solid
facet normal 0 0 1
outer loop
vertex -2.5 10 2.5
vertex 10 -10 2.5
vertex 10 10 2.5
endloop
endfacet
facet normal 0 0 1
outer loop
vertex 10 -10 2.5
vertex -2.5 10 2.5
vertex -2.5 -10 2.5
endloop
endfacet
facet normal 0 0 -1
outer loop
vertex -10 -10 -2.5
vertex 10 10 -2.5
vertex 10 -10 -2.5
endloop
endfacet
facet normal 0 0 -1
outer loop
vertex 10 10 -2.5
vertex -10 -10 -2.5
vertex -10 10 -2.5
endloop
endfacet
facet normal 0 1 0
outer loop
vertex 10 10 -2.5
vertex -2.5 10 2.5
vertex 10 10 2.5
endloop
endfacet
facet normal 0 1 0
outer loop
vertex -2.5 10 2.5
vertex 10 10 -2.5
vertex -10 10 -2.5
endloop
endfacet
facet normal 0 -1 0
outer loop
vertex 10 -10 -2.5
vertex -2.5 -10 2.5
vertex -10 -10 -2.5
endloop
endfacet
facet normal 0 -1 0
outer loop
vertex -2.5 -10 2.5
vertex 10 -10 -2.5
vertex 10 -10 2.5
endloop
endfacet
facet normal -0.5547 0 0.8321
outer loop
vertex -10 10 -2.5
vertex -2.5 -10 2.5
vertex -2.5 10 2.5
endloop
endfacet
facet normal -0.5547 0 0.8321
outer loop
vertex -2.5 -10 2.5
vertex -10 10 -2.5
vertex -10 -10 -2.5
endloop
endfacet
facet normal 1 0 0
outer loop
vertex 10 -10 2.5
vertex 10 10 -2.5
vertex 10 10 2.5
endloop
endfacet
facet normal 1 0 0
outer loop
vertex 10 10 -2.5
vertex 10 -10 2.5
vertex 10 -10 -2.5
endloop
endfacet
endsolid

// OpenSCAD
trapezoid_prism(width_lower=20, width_upper=5, depth=20, height=5, center=true, square_right=true);

module trapezoid_prism (width_lower, width_upper, depth, height, center, square_right=false) {
    /* Contruct a trapezoid prism.
    
    The prism will have it's base on the x/y plane, and it's
        top in the positive z direction.
    
    Args:
        width_lower: The width of the lower base (x-axis). Must
            be equal or greater than width_upper.
        width_upper: The width of the upper base (x-axis)
        depth: The depth of the prism (y-axis)
        height: The distance of the top from the base (z-axis)
        center: If True, the bounding box of the prism will be
            centered at (0,0,0)
        square_right: If true, the right side will not slop as expected in
            a trapezoid, but instead will be like a rectangle. Useful for 
            snap fit connectors.
    */
    
    // The prisms will twice as wide as needed, but will be 
    // unioned with the main cube to cut them in half.
    triangular_prisms_width = (width_lower - width_upper); 
    
    
    union() {
    //main cube
        cube([width_upper, depth, height], center=center);
        translate([-1 * width_upper/2, 0,0]){
            triangular_prism(width=triangular_prisms_width, depth=depth, height=height, center=center);
        }
        
        if (square_right){
            squared_width = triangular_prisms_width/2;
            translate([width_upper/2 + squared_width/2, 0,0]){
                cube([squared_width, depth, height], center=center);
            }
        }
        else{
            translate([width_upper/2, 0,0]){
                triangular_prism(width=triangular_prisms_width, depth=depth, height=height, center=center);
            }
        }
        
        
        
    }
}



module triangular_prism (width, depth, height, center) {  
    /* Contruct a triangular prism.
    
    The prism will have it's base on the x/y plane, and it's
        point (top) in the positive z direction.
    
    Args:
        width: The width of the base (x-axis)
        depth: The depth of the prism (y-axis)
        height: The distance of the top from the base (z-axis)
        center: If True, the bounding box of the prism will be
            centered at (0,0,0)
    */
    
    bottom_left_x= center ? (-1*(width/2)) : 0;
    bottom_left_y= center ? (-1*(height/2)) : 0;
    z_translate = center ? (-1 * depth/2) : 0;
    
    top_x = bottom_left_x + width/2;
    top_y = bottom_left_y + height;
    
    bottom_right_x = bottom_left_x + width;
    bottom_right_y = bottom_left_y;
    
    if (center){
        translate([width/2, height/2, 0]);
    }
    
    rotate([90, 0, 0]){
        translate([0, 0, z_translate]){
        linear_extrude(height=depth){
            polygon([[bottom_left_x, bottom_left_y], [top_x,top_y], [bottom_right_x, bottom_right_y]]);
        }
    }
    }
        
}
